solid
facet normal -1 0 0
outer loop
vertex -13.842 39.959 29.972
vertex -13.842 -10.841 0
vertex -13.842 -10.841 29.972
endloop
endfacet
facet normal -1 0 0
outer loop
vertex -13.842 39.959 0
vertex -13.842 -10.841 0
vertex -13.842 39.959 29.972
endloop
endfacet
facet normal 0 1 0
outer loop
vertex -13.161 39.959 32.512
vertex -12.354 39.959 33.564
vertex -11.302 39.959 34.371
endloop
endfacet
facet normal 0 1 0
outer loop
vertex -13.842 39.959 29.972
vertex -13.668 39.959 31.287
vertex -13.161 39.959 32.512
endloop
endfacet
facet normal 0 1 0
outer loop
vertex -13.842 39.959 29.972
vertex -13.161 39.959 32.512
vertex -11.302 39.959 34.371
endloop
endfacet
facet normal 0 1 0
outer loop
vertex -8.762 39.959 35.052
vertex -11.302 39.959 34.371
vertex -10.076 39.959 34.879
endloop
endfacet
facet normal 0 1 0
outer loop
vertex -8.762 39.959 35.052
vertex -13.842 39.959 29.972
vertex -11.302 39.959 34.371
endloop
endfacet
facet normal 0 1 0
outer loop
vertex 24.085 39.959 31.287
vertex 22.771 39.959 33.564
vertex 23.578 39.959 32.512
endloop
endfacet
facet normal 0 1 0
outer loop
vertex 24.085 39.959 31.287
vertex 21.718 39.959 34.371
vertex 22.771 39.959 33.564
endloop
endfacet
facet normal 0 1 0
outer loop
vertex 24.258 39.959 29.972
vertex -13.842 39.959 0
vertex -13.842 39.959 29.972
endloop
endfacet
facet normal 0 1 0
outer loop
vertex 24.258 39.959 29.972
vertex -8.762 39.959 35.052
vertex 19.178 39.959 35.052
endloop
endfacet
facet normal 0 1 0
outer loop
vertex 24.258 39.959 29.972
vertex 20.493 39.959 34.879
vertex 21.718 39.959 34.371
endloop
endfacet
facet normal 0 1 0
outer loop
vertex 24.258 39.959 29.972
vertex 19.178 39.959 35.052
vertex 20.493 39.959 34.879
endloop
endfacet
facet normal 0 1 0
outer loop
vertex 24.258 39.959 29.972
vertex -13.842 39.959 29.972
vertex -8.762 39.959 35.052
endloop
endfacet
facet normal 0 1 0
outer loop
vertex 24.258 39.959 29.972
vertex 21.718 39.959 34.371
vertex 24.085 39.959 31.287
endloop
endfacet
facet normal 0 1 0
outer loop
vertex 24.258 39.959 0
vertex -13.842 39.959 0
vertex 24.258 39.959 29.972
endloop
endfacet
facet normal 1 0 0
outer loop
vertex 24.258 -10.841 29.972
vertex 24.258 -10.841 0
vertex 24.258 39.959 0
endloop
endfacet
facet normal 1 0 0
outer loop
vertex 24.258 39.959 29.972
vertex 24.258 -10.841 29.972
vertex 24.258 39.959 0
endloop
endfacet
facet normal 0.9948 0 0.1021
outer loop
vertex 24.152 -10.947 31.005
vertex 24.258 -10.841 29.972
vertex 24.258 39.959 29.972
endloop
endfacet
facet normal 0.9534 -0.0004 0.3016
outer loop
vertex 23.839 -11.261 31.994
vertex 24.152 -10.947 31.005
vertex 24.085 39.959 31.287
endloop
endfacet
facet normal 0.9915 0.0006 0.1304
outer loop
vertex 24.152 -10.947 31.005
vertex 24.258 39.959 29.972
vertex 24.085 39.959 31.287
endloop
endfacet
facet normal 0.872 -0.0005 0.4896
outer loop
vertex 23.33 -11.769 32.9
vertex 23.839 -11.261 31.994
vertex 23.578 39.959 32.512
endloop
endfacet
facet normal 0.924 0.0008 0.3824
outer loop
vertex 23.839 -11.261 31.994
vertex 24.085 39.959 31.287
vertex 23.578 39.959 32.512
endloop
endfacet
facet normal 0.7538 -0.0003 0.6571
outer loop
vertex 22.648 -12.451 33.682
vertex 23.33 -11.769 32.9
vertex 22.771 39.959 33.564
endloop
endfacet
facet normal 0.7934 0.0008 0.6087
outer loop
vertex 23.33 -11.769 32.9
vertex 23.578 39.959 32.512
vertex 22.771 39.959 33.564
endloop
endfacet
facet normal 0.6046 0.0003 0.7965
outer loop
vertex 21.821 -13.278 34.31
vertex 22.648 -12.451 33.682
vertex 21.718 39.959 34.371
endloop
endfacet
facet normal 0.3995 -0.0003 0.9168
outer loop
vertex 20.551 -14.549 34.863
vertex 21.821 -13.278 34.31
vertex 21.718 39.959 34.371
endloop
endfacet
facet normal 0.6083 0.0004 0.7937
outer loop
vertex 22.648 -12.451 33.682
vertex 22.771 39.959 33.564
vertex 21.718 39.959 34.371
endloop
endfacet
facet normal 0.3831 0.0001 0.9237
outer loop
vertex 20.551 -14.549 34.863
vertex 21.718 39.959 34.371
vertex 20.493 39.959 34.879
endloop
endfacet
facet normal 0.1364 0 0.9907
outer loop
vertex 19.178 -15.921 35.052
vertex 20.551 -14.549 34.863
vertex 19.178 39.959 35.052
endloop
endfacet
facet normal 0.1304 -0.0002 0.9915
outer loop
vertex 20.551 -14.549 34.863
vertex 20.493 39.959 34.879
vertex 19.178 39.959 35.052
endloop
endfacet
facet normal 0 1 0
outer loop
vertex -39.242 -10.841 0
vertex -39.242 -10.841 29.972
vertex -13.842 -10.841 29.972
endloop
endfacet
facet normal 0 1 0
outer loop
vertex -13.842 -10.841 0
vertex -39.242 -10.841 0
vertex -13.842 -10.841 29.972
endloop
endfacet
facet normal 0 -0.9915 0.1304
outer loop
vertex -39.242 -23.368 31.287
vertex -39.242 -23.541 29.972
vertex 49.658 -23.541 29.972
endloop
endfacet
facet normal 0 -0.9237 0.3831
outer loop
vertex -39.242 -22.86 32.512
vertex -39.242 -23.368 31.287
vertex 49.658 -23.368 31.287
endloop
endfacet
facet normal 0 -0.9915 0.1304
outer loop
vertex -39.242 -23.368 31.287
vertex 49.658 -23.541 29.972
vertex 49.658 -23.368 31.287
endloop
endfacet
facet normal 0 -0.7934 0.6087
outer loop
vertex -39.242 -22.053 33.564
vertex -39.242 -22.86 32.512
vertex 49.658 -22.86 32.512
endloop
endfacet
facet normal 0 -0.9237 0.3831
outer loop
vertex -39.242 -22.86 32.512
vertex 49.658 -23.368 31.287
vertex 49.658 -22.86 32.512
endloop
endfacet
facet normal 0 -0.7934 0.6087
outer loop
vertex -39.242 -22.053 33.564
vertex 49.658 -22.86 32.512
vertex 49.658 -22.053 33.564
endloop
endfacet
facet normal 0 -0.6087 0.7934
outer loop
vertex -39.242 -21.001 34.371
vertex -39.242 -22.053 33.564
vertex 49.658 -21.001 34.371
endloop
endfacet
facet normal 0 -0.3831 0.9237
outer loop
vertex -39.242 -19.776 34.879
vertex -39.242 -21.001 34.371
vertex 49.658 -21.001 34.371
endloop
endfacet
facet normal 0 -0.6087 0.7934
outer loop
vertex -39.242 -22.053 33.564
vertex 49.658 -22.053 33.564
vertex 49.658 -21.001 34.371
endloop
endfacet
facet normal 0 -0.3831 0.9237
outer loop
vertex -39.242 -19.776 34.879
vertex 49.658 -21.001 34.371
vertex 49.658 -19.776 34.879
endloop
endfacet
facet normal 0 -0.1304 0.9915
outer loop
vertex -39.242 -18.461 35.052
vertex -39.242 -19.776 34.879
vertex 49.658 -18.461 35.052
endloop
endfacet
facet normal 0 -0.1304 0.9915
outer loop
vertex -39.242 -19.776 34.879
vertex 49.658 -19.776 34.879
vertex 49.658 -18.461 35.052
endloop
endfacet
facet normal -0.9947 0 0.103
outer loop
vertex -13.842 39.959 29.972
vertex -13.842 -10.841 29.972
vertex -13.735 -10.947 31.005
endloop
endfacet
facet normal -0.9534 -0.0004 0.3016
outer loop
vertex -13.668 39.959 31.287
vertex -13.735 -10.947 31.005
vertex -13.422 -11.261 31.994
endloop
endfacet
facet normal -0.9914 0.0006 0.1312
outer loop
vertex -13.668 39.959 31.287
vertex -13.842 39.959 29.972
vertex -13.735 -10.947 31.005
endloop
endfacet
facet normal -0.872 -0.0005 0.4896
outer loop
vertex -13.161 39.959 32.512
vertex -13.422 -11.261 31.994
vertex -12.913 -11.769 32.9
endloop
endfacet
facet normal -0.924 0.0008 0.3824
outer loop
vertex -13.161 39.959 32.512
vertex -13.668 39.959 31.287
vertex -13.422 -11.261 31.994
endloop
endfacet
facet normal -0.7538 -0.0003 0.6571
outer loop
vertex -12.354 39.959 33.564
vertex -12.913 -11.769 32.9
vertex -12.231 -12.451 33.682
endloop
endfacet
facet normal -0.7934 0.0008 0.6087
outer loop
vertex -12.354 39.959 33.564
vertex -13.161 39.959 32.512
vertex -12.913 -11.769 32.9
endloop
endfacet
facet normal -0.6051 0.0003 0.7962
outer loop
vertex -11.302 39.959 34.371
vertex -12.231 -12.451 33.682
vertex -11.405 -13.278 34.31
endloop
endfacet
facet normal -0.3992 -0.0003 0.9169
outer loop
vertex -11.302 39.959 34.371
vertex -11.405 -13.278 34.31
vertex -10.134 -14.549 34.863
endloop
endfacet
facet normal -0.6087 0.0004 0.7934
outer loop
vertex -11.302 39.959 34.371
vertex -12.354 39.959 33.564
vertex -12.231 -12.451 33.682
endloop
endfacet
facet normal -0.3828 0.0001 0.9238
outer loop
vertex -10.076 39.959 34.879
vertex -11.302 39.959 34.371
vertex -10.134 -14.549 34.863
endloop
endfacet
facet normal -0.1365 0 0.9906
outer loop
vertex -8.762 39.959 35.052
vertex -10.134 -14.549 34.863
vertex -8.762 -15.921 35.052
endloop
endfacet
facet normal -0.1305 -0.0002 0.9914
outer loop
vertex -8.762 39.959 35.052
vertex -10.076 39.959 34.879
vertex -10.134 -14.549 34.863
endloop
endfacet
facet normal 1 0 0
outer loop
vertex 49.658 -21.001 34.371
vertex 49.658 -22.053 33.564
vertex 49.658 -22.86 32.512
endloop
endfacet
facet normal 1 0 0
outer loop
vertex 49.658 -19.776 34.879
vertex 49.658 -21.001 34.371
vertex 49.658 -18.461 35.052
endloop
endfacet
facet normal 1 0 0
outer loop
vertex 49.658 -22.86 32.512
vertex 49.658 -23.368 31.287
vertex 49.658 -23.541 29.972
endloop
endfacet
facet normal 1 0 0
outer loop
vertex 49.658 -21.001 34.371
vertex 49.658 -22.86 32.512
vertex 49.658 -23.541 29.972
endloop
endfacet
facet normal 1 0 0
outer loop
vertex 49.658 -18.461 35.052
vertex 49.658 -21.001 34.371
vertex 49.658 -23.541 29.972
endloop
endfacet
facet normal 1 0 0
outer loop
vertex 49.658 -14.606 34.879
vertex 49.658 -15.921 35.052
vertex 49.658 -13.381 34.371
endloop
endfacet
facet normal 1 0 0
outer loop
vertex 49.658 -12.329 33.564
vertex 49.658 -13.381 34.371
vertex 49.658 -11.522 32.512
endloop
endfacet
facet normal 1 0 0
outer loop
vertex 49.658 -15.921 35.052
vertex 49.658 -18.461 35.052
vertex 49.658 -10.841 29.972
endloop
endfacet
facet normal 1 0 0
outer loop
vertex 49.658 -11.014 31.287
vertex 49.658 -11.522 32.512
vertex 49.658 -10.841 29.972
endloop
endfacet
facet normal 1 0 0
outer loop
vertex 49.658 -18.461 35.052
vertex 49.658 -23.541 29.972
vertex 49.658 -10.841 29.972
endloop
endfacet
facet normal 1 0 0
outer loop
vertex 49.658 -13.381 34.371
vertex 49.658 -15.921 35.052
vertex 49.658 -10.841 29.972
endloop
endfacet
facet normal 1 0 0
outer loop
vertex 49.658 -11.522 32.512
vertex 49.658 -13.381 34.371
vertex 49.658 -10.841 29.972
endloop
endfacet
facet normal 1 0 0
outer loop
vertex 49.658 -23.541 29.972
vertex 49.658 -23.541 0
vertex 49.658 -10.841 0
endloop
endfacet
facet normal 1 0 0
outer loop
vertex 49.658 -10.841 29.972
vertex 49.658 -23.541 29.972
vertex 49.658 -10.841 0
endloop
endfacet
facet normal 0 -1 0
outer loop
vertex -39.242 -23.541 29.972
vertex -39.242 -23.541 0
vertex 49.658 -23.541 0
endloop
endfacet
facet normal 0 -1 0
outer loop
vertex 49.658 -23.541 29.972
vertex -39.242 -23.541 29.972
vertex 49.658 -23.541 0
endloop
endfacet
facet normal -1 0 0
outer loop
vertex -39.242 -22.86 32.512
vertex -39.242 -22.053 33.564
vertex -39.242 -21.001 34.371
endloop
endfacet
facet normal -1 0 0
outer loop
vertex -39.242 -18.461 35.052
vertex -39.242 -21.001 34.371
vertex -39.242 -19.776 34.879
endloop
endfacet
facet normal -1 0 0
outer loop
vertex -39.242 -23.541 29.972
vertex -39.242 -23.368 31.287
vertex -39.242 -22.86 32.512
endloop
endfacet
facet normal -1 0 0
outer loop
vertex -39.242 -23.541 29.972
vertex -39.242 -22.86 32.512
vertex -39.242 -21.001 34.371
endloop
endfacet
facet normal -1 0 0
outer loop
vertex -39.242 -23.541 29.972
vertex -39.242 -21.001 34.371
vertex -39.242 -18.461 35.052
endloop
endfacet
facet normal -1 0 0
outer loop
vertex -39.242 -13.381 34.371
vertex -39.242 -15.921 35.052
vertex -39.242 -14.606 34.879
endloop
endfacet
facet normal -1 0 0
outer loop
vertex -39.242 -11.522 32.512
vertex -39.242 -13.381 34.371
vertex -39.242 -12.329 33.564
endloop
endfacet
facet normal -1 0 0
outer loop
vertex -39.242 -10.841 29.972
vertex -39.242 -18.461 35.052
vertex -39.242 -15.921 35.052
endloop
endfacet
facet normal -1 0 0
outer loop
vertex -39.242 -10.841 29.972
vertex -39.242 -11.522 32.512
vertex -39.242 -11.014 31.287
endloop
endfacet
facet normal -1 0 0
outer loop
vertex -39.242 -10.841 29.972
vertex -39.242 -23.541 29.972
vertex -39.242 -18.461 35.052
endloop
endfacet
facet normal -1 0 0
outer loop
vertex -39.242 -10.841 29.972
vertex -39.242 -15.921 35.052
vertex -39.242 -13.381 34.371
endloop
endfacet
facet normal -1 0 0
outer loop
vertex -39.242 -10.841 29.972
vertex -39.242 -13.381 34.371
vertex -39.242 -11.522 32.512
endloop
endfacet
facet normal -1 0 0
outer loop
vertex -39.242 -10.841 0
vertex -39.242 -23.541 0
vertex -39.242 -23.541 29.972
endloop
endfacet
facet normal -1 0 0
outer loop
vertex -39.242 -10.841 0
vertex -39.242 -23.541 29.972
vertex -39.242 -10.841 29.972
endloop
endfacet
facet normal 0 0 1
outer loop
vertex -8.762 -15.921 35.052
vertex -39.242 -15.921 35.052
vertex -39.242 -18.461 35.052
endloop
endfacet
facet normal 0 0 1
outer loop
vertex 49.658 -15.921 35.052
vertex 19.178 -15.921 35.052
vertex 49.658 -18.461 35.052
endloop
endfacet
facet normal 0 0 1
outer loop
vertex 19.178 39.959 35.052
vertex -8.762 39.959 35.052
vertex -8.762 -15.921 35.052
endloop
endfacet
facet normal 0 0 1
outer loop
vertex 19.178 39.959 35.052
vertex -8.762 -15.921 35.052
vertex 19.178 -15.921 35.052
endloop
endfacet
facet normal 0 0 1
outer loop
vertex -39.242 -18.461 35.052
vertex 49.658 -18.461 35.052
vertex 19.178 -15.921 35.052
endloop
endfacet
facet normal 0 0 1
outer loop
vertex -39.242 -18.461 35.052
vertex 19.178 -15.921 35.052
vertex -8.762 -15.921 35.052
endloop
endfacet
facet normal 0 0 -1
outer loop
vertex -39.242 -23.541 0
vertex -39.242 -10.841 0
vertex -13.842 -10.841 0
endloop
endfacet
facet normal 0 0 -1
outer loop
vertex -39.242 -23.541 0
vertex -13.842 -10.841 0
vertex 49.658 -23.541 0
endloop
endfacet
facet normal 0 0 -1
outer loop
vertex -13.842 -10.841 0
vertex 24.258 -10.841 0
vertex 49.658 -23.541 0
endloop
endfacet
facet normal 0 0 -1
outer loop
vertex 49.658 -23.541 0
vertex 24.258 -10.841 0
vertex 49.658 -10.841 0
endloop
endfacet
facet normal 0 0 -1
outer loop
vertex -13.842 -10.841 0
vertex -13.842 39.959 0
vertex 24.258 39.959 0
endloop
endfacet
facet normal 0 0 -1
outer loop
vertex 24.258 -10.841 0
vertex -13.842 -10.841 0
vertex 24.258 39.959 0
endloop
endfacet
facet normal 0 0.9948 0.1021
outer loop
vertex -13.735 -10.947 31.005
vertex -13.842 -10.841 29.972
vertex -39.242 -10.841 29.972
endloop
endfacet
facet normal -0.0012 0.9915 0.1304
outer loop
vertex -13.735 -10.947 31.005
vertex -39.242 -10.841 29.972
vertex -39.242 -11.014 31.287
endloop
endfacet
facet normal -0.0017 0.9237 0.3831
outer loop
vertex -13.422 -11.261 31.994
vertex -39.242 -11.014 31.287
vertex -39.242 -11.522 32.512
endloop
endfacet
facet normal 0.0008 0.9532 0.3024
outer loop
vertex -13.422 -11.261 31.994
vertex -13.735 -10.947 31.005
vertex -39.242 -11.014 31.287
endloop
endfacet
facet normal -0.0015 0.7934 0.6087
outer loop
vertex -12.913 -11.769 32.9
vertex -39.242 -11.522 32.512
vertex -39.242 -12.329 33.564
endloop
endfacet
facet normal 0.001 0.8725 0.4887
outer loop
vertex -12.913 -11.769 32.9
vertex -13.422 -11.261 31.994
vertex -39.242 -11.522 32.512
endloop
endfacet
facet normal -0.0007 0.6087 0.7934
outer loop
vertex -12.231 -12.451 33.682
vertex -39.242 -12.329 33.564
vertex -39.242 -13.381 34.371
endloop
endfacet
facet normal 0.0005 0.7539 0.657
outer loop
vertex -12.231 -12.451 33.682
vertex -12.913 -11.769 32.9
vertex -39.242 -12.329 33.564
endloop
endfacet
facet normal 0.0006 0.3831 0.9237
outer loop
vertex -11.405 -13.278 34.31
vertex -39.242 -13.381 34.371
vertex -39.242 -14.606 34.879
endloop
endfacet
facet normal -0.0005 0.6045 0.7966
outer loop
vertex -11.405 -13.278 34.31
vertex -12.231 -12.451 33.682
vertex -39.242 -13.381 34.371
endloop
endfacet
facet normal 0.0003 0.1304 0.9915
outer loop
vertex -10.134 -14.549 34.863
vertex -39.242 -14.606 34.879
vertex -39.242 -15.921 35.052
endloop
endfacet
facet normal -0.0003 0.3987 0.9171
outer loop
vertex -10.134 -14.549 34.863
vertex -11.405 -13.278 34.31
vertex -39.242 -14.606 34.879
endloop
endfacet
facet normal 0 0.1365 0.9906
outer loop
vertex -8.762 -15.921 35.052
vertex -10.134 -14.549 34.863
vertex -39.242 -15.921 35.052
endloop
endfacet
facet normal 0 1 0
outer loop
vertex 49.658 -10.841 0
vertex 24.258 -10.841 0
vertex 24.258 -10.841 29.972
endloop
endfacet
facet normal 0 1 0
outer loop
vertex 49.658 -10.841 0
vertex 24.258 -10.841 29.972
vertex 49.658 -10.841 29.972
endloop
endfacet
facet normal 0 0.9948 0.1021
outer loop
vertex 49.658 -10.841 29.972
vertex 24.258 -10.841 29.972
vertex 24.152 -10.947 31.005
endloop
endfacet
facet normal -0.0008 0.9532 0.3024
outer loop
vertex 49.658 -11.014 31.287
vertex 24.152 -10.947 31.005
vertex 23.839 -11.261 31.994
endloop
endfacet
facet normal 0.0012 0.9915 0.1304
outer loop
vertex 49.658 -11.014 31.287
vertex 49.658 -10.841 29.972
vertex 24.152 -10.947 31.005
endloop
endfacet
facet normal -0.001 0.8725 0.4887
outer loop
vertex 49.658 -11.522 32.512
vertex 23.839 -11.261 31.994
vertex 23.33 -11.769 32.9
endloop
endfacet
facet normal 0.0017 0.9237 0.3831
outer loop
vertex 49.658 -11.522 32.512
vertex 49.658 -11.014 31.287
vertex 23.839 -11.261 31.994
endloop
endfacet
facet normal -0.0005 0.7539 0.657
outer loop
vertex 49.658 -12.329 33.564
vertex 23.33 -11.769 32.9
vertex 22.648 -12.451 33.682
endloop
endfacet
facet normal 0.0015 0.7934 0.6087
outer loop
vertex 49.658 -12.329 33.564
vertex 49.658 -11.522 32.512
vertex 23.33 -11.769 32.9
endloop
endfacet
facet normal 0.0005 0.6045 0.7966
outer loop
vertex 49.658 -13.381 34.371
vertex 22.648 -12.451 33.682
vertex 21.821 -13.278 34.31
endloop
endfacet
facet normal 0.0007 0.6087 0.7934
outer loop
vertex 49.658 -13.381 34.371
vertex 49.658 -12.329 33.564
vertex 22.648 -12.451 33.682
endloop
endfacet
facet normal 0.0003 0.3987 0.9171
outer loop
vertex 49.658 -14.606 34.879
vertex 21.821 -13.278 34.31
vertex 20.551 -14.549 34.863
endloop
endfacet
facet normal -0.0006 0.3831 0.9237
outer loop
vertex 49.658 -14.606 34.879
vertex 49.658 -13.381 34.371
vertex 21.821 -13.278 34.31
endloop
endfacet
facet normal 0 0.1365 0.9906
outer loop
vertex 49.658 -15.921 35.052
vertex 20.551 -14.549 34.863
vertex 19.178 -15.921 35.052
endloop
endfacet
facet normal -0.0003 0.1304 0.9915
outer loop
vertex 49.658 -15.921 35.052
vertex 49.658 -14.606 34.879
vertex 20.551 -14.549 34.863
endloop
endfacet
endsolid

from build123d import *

# Parameters (mm, degrees)
F0_W     = 38.1
F0_H     = 50.8
F0_W_2   = 25.4
F0_H_2   = 12.7
F1_DEPTH = 35.052
F2_R     = 5.08


with BuildPart() as f1:
    # F0 (on Top) → F1 (new body)
    with BuildSketch(Plane.XY):
        with Locations((5.208455, 14.55895)):
            Rectangle(F0_W, F0_H)
        with Locations((-26.541545, -17.19105)):
            Rectangle(F0_W_2, F0_H_2)
        with Locations((5.208455, -17.19105)):
            Rectangle(F0_W, F0_H_2)
        with Locations((36.958455, -17.19105)):
            Rectangle(F0_W_2, F0_H_2)
    extrude(amount=F1_DEPTH)

    # F2
    f2_edges = [f1.edges().sort_by_distance(p)[0] for p in [
        (24.258455, 14.55895, 35.052),
        (-13.841545, 14.55895, 35.052),
        (-26.541545, -10.84105, 35.052),
        (36.958455, -10.84105, 35.052),
        (5.208455, -23.54105, 35.052),
    ]]
    fillet(f2_edges, radius=F2_R)


solid = f1.part
